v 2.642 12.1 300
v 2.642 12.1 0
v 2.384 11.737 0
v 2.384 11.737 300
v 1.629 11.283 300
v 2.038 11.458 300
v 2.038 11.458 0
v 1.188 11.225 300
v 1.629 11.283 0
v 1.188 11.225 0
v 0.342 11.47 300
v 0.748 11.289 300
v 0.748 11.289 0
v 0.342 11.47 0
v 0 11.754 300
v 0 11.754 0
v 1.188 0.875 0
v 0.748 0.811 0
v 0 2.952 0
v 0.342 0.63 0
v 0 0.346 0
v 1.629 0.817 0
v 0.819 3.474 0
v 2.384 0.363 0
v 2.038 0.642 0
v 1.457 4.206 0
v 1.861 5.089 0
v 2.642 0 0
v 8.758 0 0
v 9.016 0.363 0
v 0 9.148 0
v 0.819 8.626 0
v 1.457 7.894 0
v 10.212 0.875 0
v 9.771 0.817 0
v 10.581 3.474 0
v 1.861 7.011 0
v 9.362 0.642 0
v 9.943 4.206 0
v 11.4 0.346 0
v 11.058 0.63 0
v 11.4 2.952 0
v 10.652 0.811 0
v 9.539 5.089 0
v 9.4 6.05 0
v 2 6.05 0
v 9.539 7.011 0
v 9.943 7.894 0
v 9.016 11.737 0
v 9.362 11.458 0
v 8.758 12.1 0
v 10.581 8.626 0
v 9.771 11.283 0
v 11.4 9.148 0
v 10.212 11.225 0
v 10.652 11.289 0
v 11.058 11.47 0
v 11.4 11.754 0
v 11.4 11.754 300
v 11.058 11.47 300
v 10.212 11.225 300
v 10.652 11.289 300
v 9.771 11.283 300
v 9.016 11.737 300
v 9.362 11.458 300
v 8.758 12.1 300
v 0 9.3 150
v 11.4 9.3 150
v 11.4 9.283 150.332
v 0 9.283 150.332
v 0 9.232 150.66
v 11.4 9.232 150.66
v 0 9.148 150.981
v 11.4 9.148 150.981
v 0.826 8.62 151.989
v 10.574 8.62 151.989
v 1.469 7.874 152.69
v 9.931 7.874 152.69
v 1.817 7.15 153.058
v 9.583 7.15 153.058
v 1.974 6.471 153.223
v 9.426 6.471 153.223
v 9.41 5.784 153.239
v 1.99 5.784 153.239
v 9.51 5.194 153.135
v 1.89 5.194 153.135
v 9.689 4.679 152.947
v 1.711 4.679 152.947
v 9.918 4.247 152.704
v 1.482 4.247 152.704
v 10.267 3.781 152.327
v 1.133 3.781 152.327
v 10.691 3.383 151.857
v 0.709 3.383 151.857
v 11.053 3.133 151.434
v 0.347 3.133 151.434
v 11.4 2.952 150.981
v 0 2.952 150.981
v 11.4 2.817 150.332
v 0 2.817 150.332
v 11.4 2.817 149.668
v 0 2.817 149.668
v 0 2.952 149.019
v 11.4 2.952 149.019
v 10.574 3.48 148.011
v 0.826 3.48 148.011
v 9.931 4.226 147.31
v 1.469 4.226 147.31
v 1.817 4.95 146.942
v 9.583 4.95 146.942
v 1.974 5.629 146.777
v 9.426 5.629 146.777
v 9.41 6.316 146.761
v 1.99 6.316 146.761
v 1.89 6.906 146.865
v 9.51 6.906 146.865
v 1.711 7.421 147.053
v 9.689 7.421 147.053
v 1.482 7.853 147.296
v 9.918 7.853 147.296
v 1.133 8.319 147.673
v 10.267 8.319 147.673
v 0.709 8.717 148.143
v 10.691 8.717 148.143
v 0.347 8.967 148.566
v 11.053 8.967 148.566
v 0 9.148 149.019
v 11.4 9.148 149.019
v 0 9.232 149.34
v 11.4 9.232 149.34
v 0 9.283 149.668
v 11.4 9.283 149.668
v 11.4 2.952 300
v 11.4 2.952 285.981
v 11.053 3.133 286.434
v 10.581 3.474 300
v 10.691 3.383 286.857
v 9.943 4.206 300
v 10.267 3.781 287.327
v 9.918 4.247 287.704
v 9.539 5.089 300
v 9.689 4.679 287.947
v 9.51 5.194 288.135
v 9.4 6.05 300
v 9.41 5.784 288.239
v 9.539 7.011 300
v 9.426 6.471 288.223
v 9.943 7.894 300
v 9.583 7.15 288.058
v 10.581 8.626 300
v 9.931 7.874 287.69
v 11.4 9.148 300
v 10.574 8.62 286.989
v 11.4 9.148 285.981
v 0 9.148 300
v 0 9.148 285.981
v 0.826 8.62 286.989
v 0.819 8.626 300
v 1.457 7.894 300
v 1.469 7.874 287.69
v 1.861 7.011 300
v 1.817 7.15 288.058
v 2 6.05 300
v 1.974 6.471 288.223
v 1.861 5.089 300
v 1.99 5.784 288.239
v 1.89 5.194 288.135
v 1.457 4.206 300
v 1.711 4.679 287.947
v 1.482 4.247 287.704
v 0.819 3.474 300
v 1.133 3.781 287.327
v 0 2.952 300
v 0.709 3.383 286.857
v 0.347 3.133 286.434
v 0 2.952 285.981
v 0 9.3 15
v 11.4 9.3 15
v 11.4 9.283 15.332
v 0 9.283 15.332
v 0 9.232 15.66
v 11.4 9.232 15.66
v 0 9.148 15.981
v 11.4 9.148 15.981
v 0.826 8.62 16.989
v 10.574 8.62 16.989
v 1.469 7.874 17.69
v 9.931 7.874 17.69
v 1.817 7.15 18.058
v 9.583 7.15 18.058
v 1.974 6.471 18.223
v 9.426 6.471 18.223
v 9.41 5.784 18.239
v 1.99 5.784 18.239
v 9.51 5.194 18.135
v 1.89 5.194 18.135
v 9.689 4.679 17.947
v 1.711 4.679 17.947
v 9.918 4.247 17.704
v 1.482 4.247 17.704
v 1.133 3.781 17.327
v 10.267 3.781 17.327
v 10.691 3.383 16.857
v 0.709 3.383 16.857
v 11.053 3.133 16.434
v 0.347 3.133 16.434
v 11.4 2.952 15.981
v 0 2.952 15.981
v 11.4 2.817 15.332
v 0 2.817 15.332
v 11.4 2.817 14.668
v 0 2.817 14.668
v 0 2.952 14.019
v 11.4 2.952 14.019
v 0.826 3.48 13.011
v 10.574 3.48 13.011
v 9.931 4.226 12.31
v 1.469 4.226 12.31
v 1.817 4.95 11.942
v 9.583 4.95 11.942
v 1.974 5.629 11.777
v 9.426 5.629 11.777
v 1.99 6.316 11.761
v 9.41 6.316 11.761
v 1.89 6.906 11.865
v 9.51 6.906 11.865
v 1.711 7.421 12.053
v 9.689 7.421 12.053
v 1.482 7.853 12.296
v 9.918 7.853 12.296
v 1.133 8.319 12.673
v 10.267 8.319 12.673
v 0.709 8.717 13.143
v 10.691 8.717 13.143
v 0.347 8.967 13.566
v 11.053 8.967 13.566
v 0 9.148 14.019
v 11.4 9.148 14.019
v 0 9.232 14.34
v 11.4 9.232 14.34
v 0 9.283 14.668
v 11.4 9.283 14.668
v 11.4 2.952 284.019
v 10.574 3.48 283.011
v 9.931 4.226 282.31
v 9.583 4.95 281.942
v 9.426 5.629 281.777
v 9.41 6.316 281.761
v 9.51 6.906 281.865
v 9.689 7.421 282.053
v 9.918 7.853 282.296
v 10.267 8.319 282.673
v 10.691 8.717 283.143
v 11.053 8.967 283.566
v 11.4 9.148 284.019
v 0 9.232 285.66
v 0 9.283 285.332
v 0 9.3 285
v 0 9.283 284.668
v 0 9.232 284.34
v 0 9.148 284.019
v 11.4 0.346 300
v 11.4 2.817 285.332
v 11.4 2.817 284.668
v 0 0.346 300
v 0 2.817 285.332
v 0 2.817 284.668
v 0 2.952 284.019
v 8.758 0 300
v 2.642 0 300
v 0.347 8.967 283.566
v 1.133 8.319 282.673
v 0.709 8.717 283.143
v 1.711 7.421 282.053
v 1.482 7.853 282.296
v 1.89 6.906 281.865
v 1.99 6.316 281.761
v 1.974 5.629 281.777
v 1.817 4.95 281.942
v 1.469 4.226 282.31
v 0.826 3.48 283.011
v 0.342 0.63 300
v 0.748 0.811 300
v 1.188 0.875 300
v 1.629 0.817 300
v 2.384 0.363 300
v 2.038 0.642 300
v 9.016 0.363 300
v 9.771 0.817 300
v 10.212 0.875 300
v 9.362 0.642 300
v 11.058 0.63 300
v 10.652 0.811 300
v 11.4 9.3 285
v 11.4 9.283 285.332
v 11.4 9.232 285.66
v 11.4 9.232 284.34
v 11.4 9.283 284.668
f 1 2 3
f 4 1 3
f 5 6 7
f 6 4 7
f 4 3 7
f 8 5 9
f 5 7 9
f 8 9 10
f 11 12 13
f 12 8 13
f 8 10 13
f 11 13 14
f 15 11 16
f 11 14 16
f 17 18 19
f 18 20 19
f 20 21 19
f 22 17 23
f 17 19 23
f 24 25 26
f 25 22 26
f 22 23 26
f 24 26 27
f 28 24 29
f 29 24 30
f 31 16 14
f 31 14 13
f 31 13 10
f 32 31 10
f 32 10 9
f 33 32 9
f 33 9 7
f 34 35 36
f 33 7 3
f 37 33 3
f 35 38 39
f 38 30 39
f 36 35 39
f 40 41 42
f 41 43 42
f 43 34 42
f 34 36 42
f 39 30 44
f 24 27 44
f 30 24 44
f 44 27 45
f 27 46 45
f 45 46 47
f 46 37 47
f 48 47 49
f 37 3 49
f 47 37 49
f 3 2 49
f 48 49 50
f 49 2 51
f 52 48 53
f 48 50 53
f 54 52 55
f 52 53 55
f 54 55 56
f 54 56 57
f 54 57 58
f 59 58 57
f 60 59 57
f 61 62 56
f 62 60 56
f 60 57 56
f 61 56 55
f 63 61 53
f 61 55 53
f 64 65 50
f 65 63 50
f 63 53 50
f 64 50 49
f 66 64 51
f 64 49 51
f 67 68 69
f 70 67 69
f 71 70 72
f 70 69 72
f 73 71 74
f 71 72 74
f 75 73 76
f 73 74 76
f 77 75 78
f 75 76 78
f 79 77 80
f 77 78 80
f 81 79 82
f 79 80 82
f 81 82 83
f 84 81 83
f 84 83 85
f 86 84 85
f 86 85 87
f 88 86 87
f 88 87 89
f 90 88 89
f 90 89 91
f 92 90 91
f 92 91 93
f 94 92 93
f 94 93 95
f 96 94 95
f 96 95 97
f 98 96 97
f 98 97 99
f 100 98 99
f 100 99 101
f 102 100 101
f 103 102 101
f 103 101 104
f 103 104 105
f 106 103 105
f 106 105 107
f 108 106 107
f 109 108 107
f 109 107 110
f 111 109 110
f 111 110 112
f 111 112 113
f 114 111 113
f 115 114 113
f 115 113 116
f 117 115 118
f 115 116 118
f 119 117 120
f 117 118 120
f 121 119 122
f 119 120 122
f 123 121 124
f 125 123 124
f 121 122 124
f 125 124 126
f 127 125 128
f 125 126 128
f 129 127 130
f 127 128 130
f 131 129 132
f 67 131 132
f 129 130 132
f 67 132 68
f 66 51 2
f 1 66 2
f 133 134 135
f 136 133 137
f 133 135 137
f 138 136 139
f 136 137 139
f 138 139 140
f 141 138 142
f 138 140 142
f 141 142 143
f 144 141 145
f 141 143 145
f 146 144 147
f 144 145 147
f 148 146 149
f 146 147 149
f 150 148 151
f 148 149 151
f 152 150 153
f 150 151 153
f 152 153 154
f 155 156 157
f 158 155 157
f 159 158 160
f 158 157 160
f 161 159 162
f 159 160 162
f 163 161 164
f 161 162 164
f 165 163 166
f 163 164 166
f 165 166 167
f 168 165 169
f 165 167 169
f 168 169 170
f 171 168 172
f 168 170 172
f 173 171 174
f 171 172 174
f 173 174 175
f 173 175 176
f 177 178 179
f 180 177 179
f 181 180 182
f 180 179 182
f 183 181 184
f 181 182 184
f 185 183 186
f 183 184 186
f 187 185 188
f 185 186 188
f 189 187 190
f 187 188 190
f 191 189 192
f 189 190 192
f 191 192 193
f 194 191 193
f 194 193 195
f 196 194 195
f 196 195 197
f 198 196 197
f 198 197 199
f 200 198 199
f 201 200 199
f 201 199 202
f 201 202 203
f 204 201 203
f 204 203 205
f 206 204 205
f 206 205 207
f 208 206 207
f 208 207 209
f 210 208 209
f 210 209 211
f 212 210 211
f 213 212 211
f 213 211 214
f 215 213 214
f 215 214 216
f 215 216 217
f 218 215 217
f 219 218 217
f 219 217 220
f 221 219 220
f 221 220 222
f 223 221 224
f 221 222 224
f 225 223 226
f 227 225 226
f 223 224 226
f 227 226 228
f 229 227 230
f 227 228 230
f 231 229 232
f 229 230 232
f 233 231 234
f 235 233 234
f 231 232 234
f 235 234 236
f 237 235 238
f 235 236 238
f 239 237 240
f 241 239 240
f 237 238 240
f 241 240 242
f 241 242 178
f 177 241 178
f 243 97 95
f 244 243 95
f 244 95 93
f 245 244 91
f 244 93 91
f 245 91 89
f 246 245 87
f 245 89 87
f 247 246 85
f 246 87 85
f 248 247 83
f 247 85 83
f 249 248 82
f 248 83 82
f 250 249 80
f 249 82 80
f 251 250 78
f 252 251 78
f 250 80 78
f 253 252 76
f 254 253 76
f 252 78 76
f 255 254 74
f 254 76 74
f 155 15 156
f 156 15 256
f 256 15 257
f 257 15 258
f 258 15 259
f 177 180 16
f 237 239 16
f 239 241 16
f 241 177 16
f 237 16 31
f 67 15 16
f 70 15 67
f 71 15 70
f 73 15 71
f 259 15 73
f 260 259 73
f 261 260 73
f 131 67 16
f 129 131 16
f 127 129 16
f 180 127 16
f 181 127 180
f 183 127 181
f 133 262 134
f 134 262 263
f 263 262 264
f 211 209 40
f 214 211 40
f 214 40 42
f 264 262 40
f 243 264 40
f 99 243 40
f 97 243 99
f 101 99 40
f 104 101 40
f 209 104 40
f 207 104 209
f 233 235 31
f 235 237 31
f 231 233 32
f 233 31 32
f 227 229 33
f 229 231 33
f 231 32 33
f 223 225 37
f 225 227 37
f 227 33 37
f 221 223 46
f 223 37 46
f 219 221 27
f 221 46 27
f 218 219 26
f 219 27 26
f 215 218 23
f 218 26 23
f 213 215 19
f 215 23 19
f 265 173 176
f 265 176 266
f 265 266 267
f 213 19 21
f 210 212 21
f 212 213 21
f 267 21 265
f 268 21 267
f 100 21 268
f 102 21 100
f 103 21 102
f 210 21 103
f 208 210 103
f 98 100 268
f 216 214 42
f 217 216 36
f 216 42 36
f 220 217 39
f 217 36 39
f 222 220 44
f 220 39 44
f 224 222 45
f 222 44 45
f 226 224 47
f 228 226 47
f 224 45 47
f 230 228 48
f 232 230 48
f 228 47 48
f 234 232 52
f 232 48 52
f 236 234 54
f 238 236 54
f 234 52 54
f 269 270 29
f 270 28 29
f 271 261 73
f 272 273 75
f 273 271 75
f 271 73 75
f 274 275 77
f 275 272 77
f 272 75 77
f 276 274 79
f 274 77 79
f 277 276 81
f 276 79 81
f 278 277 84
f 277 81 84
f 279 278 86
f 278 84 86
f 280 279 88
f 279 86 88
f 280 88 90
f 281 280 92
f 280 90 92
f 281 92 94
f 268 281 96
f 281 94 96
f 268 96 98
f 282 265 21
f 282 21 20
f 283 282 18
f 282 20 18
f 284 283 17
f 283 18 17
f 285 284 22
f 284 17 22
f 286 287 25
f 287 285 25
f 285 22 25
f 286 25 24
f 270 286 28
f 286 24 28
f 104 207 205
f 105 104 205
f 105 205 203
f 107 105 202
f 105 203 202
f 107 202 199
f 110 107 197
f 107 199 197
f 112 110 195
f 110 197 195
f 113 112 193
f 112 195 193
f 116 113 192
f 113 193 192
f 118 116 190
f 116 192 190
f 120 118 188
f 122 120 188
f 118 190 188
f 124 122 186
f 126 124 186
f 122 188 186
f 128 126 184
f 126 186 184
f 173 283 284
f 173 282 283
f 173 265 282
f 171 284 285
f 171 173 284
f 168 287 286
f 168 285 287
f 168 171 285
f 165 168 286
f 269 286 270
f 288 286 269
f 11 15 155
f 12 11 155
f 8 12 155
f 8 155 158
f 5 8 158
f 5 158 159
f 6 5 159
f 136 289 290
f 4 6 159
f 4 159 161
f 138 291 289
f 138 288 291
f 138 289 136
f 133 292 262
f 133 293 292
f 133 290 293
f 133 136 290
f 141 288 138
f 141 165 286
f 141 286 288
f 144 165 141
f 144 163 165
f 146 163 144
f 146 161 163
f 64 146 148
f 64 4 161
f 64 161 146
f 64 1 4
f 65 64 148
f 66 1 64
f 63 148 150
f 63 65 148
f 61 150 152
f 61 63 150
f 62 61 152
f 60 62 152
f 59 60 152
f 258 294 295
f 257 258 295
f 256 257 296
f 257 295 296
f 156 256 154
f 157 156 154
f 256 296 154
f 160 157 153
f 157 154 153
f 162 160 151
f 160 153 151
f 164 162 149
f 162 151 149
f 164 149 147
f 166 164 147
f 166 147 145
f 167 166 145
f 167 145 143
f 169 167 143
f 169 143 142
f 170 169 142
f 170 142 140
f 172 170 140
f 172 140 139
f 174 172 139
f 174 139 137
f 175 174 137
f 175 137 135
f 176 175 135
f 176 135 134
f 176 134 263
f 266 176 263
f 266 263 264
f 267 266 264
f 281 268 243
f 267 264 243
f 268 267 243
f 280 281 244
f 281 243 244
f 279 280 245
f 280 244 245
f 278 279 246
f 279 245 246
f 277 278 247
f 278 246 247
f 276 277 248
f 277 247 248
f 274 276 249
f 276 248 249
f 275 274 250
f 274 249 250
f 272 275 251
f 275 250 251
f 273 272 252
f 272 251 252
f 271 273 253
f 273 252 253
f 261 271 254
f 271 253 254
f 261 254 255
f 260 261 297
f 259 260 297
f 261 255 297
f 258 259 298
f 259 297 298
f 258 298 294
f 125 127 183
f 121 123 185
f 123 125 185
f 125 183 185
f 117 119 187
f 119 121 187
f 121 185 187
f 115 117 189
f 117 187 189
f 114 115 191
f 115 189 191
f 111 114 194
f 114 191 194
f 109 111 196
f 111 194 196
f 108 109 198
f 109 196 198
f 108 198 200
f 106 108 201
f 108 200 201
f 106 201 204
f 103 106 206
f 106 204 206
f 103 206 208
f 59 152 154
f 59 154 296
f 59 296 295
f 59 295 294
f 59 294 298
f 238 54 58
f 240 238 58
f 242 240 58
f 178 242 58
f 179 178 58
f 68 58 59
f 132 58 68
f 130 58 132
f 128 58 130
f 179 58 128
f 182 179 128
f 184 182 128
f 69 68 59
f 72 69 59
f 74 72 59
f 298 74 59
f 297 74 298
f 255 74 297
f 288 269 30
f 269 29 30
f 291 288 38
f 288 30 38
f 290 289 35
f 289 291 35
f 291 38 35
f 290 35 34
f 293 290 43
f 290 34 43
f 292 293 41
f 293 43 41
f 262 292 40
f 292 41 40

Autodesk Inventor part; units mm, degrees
sketch "Sketch_1" plane through (0, 0, 0) normal (0, 0, 1) x (1, 0, 0)
  line L0 (0, 2.9516) -> (0, 0.3457)
  arc A0 (2.6416, 0) -> (0, 0.3457) centre (1.2, -0.75) ccw
  line L1 (2.6416, 0) -> (8.7584, 0)
  arc A1 (11.4, 0.3457) -> (8.7584, 0) centre (10.2, -0.75) ccw
  line L2 (11.4, 0.3457) -> (11.4, 2.9516)
  arc A2 (11.4, 9.1484) -> (11.4, 2.9516) centre (12.8, 6.05) ccw
  line L3 (11.4, 9.1484) -> (11.4, 11.7543)
  arc A3 (8.7584, 12.1) -> (11.4, 11.7543) centre (10.2, 12.85) ccw
  line L4 (8.7584, 12.1) -> (2.6416, 12.1)
  arc A4 (0, 11.7543) -> (2.6416, 12.1) centre (1.2, 12.85) ccw
  line L5 (0, 11.7543) -> (0, 9.1484)
  arc A5 (0, 2.9516) -> (0, 9.1484) centre (-1.4, 6.05) ccw
extrude "Extrusion1" add sketch "Sketch_1" along normal blind 300
sketch "Sketch_3" plane through (0, 0, 15) normal (0, 0, 1) x (1, 0, 0)
  line L0 (11.4, 6.05) -> (0, 6.05)
  line L1 (0, 6.05) -> (0, 9.3)
  line L2 (0, 9.3) -> (11.4, 9.3)
  line L3 (11.4, 9.3) -> (11.4, 6.05)
  line L4 (11.4, 6.05) -> (0, 6.05)
revolve "Revolution1" cut sketch "Sketch_3" angle 360 about axis through (11.4, 6.05, 15) along (1, 0, 0)
pattern_linear "Rectangular Pattern1" count 3 spacing 135 along (0, 0, 1) of "Revolution1"
ref_plane "to_ball_1_XY" through (1.2, -0.75, 109.375) normal (0, 0, 1) x (1, 0, 0)
ref_plane "to_ball_1_YZ" through (1.2, -0.75, 109.375) normal (1, 0, 0) x (0, 1, 0)
ref_plane "to_ball_1_ZX" through (1.2, -0.75, 109.375) normal (0, 1, 0) x (0, 0, 1)
ref_plane "to_ball_2_XY" through (10.2, -0.75, 109.375) normal (0, 0, 1) x (1, 0, 0)
ref_plane "to_ball_2_YZ" through (10.2, -0.75, 109.375) normal (1, 0, 0) x (0, 1, 0)
ref_plane "to_ball_2_ZX" through (10.2, -0.75, 109.375) normal (0, 1, 0) x (0, 0, 1)
ref_plane "to_ball_3_XY" through (1.2, 12.85, 109.375) normal (0, 0, 1) x (1, 0, 0)
ref_plane "to_ball_3_YZ" through (1.2, 12.85, 109.375) normal (1, 0, 0) x (0, 1, 0)
ref_plane "to_ball_3_ZX" through (1.2, 12.85, 109.375) normal (0, 1, 0) x (0, 0, 1)
ref_plane "to_ball_4_XY" through (10.2, 12.85, 109.375) normal (0, 0, 1) x (1, 0, 0)
ref_plane "to_ball_4_YZ" through (10.2, 12.85, 109.375) normal (1, 0, 0) x (0, 1, 0)
ref_plane "to_ball_4_ZX" through (10.2, 12.85, 109.375) normal (0, 1, 0) x (0, 0, 1)
ref_plane "to_body_XY" through (5.6, 6.05, 150) normal (0, 0, 1) x (1, 0, 0)
ref_plane "to_body_YZ" through (5.6, 6.05, 150) normal (1, 0, 0) x (0, 1, 0)
ref_plane "to_body_ZX" through (5.6, 6.05, 150) normal (0, 1, 0) x (0, 0, 1)
ref_plane "to_body2_XY" through (5.8, 6.05, 150) normal (0, 0, 1) x (1, 0, 0)
ref_plane "to_body2_YZ" through (5.8, 6.05, 150) normal (1, 0, 0) x (0, 1, 0)
ref_plane "to_body2_ZX" through (5.8, 6.05, 150) normal (0, 1, 0) x (0, 0, 1)
properties part number "SAR330-30_r" material "Aluminum 6061"
